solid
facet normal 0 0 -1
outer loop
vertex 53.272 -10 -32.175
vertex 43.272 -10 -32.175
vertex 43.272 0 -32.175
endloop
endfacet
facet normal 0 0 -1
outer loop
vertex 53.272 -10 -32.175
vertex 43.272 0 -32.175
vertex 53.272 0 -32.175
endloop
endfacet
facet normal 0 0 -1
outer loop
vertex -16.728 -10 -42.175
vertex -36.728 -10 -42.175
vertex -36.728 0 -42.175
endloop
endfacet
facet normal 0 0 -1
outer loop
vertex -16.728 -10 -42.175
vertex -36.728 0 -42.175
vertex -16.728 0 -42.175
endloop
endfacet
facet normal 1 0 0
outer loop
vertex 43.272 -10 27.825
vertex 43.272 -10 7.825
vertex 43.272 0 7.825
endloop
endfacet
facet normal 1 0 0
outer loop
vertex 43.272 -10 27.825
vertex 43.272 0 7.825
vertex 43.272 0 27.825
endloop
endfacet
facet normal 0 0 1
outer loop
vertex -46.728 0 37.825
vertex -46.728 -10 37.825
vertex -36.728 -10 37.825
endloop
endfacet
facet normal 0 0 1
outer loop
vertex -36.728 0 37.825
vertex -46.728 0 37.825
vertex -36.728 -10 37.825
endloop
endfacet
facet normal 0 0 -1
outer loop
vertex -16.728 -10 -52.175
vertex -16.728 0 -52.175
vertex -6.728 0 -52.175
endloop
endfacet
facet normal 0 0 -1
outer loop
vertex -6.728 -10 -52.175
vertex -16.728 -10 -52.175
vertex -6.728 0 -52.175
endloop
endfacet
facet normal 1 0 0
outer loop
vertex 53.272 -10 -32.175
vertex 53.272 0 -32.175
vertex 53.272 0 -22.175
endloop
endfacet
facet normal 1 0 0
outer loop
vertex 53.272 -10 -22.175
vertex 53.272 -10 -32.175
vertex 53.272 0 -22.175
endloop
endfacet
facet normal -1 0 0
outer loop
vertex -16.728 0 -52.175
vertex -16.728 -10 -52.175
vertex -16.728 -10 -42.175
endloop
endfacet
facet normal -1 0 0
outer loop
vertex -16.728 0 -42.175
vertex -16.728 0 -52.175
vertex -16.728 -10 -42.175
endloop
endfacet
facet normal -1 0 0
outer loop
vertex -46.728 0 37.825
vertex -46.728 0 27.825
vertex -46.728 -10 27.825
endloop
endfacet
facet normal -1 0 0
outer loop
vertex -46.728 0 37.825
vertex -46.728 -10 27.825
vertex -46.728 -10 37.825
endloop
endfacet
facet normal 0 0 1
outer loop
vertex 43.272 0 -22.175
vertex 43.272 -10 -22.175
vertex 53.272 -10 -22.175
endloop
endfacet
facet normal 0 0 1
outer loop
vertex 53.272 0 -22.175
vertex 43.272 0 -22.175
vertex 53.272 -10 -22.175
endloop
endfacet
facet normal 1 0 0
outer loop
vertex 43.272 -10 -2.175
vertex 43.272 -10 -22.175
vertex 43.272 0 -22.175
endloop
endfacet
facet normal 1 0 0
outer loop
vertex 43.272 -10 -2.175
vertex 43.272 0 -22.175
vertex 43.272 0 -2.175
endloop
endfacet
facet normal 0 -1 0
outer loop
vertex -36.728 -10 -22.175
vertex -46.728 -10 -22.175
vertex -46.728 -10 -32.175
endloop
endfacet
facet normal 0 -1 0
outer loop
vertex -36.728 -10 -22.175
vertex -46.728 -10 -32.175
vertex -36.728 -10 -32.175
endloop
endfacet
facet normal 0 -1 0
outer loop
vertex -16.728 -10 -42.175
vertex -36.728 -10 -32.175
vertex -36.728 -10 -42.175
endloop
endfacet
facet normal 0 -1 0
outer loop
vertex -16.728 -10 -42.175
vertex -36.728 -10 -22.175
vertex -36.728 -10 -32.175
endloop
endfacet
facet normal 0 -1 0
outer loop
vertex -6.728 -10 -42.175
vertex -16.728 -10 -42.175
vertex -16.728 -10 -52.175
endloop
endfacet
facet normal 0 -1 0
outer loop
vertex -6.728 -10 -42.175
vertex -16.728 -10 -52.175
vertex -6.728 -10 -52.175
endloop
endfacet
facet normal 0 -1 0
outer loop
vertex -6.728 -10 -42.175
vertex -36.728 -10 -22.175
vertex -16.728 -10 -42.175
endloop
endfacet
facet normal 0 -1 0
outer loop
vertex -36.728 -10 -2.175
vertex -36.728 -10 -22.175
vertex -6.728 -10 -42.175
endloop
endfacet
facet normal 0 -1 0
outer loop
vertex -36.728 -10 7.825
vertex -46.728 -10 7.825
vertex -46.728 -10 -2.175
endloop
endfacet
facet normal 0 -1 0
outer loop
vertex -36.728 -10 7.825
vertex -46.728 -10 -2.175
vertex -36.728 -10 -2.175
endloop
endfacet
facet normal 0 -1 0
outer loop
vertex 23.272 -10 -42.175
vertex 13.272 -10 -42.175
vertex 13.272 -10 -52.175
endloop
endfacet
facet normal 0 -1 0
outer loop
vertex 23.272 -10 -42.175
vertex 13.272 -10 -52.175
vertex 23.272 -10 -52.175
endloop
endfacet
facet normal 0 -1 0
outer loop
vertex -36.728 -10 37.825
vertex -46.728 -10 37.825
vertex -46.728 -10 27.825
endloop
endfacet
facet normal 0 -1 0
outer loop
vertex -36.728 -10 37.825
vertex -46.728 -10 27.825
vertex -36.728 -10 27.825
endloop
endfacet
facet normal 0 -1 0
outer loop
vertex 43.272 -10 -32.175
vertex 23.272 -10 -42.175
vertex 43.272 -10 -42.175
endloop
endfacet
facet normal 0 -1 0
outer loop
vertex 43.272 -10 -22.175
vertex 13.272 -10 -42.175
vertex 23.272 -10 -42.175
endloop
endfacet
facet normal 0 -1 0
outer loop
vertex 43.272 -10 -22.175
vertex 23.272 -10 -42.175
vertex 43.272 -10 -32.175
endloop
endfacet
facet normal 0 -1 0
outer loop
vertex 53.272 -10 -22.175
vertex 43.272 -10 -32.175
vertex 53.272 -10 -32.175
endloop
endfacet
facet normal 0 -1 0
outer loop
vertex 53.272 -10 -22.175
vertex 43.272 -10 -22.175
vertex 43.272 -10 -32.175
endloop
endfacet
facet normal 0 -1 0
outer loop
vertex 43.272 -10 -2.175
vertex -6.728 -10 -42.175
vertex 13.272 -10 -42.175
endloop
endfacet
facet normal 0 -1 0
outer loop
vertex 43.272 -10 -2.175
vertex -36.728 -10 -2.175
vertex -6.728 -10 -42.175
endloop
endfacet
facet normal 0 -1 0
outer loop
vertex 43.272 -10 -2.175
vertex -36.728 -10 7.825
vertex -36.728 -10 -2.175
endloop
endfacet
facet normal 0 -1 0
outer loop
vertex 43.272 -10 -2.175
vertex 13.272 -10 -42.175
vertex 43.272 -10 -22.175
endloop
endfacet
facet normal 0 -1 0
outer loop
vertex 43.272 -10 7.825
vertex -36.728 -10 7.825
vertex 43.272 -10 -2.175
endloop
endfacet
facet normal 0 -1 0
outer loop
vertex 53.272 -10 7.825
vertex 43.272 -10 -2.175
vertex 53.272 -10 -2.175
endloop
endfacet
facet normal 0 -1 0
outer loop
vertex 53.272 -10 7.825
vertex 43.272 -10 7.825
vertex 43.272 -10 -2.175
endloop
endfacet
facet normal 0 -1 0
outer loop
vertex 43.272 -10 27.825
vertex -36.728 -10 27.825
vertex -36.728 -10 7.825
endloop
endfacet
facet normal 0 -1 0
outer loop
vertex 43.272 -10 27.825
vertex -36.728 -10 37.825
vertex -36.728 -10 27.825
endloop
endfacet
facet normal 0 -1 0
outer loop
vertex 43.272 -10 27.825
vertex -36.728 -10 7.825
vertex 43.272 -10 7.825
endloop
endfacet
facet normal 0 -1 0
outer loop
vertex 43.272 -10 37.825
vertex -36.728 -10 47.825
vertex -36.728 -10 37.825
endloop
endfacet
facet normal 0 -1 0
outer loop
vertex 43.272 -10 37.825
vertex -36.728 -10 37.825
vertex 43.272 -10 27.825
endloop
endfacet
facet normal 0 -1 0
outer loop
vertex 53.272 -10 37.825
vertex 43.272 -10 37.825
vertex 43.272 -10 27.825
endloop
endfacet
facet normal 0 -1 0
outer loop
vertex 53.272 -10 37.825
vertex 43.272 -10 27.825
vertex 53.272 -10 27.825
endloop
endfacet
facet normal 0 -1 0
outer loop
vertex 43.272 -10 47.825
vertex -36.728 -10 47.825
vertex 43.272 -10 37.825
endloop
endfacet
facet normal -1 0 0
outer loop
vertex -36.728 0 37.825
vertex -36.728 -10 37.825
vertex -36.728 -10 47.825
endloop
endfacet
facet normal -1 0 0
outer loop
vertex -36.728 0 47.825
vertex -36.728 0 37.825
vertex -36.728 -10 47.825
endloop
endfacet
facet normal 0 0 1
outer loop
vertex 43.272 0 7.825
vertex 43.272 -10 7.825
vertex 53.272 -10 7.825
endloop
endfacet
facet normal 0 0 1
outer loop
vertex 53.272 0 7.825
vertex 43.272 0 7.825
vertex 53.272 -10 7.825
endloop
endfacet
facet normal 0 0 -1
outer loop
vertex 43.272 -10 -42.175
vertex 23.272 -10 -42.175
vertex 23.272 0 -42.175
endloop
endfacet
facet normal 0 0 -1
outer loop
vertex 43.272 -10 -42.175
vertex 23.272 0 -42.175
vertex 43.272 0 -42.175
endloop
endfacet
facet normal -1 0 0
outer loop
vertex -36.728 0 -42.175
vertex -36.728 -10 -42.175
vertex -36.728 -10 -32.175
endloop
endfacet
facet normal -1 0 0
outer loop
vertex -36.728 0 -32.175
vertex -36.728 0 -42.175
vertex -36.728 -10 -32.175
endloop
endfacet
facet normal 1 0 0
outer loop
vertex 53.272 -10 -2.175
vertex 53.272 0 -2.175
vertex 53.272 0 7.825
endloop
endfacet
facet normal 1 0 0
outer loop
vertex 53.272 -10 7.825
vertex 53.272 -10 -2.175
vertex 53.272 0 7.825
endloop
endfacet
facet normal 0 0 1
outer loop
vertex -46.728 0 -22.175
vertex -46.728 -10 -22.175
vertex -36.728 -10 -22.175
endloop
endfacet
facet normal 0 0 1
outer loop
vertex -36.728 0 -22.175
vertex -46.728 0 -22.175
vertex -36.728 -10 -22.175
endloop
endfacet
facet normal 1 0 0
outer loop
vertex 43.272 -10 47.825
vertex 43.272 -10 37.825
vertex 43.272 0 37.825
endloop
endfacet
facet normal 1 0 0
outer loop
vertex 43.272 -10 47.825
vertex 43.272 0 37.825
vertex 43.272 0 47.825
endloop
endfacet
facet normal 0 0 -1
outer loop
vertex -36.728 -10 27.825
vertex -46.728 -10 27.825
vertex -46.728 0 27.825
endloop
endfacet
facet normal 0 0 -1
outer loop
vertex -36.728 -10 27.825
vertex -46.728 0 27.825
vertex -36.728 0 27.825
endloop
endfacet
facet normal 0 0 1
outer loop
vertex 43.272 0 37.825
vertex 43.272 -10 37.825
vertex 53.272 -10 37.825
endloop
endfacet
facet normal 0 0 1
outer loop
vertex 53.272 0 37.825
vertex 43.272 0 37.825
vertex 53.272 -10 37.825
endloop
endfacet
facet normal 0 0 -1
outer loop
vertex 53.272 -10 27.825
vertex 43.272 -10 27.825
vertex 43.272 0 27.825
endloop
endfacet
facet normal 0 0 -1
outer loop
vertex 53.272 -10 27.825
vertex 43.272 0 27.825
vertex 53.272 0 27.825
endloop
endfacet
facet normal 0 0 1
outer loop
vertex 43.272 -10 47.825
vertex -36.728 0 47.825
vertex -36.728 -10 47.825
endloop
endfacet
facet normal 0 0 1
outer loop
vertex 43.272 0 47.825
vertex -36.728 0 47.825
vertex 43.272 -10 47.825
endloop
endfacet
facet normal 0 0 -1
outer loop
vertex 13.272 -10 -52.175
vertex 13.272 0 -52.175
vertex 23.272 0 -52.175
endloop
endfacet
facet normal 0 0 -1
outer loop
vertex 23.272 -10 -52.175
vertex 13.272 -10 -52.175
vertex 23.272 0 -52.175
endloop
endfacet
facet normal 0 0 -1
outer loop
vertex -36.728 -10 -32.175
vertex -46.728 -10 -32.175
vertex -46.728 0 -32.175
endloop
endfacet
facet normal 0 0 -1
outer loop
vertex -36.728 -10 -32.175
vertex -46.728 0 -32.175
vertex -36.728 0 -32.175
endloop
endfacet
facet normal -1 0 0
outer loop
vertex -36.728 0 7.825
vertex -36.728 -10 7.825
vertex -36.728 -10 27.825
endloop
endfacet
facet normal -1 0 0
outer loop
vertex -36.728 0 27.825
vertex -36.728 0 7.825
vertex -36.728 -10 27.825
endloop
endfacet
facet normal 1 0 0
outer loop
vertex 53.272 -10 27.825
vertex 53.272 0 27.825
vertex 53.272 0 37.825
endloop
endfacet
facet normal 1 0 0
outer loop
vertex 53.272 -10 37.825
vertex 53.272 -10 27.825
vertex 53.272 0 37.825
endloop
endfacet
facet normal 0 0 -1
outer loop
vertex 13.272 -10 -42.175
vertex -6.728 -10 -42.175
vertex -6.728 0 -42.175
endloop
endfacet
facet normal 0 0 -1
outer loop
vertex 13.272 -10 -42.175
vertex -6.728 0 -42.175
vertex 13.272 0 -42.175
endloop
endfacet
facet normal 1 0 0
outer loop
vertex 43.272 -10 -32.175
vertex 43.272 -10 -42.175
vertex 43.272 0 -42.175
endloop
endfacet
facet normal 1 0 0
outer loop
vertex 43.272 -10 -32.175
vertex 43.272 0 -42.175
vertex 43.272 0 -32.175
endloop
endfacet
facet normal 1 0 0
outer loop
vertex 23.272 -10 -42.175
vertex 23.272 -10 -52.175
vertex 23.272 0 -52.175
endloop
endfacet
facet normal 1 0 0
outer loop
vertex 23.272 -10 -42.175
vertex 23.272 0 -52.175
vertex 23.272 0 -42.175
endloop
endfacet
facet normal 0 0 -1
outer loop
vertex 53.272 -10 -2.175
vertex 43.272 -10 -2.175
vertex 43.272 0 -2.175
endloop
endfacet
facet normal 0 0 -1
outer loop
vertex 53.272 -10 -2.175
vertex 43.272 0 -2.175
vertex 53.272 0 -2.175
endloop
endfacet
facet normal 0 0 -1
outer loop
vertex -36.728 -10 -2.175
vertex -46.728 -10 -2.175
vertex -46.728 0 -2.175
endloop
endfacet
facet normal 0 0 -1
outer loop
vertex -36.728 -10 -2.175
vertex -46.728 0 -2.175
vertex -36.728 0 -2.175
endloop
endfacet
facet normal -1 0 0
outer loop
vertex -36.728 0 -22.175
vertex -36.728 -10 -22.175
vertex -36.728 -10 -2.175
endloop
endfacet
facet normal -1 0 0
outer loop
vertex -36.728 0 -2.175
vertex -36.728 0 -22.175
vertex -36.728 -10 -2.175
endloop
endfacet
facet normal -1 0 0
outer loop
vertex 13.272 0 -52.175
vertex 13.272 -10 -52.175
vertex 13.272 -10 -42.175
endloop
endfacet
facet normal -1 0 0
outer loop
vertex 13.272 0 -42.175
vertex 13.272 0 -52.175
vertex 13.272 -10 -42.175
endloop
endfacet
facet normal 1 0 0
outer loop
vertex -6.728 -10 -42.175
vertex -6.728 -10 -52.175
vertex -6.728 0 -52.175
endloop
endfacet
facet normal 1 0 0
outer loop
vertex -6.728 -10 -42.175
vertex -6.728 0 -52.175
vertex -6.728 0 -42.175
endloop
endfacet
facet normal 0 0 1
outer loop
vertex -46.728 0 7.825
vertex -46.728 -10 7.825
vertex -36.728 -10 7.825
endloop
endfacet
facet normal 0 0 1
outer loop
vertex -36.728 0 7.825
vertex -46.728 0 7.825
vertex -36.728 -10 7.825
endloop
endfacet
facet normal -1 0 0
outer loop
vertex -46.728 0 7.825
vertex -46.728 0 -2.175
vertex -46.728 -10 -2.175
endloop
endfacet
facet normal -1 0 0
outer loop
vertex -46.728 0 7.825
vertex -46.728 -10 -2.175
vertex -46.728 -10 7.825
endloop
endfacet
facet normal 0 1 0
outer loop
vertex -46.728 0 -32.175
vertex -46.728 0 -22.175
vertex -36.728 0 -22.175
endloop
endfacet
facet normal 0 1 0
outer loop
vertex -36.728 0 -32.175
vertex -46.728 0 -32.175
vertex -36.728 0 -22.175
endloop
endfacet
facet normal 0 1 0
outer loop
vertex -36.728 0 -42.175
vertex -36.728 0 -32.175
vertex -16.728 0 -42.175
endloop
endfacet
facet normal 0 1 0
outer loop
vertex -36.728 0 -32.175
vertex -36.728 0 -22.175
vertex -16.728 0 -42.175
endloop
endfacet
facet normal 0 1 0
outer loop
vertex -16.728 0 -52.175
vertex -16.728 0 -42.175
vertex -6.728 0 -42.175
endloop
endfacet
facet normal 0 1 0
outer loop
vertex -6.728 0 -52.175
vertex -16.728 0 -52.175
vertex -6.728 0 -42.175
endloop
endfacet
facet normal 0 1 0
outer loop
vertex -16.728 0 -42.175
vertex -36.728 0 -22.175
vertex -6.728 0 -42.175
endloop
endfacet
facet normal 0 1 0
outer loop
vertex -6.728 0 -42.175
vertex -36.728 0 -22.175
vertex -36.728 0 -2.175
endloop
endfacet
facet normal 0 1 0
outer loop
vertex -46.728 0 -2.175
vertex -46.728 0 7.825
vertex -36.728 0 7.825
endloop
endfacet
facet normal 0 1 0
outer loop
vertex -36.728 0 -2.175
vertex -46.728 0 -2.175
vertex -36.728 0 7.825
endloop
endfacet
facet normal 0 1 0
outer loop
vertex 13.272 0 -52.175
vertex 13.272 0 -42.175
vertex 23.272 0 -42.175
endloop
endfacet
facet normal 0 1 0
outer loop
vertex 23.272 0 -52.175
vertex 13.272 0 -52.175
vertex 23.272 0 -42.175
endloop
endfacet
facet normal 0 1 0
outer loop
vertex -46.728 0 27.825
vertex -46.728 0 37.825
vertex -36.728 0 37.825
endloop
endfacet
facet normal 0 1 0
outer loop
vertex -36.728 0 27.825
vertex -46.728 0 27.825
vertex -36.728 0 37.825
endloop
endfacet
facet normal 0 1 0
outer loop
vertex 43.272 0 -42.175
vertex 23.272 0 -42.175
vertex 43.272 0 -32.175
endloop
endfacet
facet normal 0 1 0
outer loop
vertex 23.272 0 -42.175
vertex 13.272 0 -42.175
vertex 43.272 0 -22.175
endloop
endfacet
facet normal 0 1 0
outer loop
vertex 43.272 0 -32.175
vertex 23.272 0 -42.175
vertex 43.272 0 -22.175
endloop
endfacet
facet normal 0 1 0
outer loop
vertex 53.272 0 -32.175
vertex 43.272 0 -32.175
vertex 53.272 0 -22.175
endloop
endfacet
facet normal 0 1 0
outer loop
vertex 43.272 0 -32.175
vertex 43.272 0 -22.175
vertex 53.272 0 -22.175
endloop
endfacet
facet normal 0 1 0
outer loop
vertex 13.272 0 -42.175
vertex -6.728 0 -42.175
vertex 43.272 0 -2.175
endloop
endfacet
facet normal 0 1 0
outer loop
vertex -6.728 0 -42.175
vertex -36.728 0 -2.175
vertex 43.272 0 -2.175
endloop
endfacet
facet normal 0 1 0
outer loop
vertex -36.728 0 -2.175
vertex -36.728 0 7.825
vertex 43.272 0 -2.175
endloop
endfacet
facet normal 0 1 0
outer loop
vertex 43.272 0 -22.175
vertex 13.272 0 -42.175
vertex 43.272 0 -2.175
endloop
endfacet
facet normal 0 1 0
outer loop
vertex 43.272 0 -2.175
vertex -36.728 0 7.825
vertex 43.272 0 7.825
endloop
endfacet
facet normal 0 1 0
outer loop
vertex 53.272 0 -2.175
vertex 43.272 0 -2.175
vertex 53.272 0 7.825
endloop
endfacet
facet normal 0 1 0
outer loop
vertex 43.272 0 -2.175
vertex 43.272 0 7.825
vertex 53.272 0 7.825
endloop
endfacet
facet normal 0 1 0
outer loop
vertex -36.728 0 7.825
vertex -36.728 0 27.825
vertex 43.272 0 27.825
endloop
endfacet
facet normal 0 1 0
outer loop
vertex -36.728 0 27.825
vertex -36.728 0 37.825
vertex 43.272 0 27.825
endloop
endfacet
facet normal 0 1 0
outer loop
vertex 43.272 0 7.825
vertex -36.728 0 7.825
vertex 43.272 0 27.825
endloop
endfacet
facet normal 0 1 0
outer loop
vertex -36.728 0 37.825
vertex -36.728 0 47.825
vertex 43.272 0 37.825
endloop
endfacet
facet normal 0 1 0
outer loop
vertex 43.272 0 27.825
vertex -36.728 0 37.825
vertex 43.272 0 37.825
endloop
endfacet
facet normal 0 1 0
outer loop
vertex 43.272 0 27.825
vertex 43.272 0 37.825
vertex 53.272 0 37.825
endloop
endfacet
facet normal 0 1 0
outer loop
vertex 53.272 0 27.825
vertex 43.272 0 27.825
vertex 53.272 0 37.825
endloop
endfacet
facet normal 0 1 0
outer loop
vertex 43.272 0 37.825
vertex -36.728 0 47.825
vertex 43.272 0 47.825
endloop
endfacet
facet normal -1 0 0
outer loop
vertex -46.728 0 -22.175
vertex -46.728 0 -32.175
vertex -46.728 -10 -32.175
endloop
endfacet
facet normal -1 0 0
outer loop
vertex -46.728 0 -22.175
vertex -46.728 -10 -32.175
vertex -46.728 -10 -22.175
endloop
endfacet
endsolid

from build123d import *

# Parameters (mm, degrees)
F0_W      = 100
F0_H      = 100
F1_DEPTH  = 10
F2_W      = 10
F2_H      = 10
F3_DEPTH  = 10
F4_W      = 10
F4_H      = 20
F5_DEPTH  = 10
F6_W      = 10
F6_H      = 20
F7_DEPTH  = 10
F8_W      = 10
F8_H      = 20
F9_DEPTH  = 10
F10_W     = 20
F10_H     = 10
F11_DEPTH = 10
F12_W     = 20
F12_H     = 10
F13_DEPTH = 10
F14_W     = 20
F14_H     = 10
F15_DEPTH = 10
F16_W     = 10
F16_H     = 10
F17_DEPTH = 10
F18_W     = 10
F18_H     = 20
F19_DEPTH = 10
F20_W     = 10
F20_H     = 20
F21_DEPTH = 10
F22_W     = 10
F22_H     = 20
F23_DEPTH = 10


with BuildPart() as f1:
    # F0 (on Front) → F1 (new body)
    with BuildSketch(Plane.XZ):
        with Locations((3.271748, -2.17455)):
            Rectangle(F0_W, F0_H)
    extrude(amount=F1_DEPTH)

    # F2 (on face) → F3 (cut)
    with BuildSketch(Plane.XZ.offset(10)):
        with Locations((-41.728252, 42.82545)):
            Rectangle(F2_W, F2_H)
    extrude(amount=-F3_DEPTH, mode=Mode.SUBTRACT)

    # F4 (on face) → F5 (cut)
    with BuildSketch(Plane.XZ.offset(10)):
        with Locations((-41.728252, 17.82545)):
            Rectangle(F4_W, F4_H)
    extrude(amount=-F5_DEPTH, mode=Mode.SUBTRACT)

    # F6 (on face) → F7 (cut)
    with BuildSketch(Plane.XZ.offset(10)):
        with Locations((-41.728252, -12.17455)):
            Rectangle(F6_W, F6_H)
    extrude(amount=-F7_DEPTH, mode=Mode.SUBTRACT)

    # F8 (on face) → F9 (cut)
    with BuildSketch(Plane.XZ.offset(10)):
        with Locations((-41.728252, -42.17455)):
            Rectangle(F8_W, F8_H)
    extrude(amount=-F9_DEPTH, mode=Mode.SUBTRACT)

    # F10 (on face) → F11 (cut)
    with BuildSketch(Plane.XZ.offset(10)):
        with Locations((-26.728252, -47.17455)):
            Rectangle(F10_W, F10_H)
    extrude(amount=-F11_DEPTH, mode=Mode.SUBTRACT)

    # F12 (on face) → F13 (cut)
    with BuildSketch(Plane.XZ.offset(10)):
        with Locations((3.271748, -47.17455)):
            Rectangle(F12_W, F12_H)
    extrude(amount=-F13_DEPTH, mode=Mode.SUBTRACT)

    # F14 (on face) → F15 (cut)
    with BuildSketch(Plane.XZ.offset(10)):
        with Locations((33.271748, -47.17455)):
            Rectangle(F14_W, F14_H)
    extrude(amount=-F15_DEPTH, mode=Mode.SUBTRACT)

    # F16 (on face) → F17 (cut)
    with BuildSketch(Plane.XZ.offset(10)):
        with Locations((48.271748, 42.82545)):
            Rectangle(F16_W, F16_H)
    extrude(amount=-F17_DEPTH, mode=Mode.SUBTRACT)

    # F18 (on face) → F19 (cut)
    with BuildSketch(Plane.XZ.offset(10)):
        with Locations((48.271748, 17.82545)):
            Rectangle(F18_W, F18_H)
    extrude(amount=-F19_DEPTH, mode=Mode.SUBTRACT)

    # F20 (on face) → F21 (cut)
    with BuildSketch(Plane.XZ.offset(10)):
        with Locations((48.271748, -12.17455)):
            Rectangle(F20_W, F20_H)
    extrude(amount=-F21_DEPTH, mode=Mode.SUBTRACT)

    # F22 (on face) → F23 (cut)
    with BuildSketch(Plane.XZ.offset(10)):
        with Locations((48.271748, -42.17455)):
            Rectangle(F22_W, F22_H)
    extrude(amount=-F23_DEPTH, mode=Mode.SUBTRACT)


solid = f1.part
